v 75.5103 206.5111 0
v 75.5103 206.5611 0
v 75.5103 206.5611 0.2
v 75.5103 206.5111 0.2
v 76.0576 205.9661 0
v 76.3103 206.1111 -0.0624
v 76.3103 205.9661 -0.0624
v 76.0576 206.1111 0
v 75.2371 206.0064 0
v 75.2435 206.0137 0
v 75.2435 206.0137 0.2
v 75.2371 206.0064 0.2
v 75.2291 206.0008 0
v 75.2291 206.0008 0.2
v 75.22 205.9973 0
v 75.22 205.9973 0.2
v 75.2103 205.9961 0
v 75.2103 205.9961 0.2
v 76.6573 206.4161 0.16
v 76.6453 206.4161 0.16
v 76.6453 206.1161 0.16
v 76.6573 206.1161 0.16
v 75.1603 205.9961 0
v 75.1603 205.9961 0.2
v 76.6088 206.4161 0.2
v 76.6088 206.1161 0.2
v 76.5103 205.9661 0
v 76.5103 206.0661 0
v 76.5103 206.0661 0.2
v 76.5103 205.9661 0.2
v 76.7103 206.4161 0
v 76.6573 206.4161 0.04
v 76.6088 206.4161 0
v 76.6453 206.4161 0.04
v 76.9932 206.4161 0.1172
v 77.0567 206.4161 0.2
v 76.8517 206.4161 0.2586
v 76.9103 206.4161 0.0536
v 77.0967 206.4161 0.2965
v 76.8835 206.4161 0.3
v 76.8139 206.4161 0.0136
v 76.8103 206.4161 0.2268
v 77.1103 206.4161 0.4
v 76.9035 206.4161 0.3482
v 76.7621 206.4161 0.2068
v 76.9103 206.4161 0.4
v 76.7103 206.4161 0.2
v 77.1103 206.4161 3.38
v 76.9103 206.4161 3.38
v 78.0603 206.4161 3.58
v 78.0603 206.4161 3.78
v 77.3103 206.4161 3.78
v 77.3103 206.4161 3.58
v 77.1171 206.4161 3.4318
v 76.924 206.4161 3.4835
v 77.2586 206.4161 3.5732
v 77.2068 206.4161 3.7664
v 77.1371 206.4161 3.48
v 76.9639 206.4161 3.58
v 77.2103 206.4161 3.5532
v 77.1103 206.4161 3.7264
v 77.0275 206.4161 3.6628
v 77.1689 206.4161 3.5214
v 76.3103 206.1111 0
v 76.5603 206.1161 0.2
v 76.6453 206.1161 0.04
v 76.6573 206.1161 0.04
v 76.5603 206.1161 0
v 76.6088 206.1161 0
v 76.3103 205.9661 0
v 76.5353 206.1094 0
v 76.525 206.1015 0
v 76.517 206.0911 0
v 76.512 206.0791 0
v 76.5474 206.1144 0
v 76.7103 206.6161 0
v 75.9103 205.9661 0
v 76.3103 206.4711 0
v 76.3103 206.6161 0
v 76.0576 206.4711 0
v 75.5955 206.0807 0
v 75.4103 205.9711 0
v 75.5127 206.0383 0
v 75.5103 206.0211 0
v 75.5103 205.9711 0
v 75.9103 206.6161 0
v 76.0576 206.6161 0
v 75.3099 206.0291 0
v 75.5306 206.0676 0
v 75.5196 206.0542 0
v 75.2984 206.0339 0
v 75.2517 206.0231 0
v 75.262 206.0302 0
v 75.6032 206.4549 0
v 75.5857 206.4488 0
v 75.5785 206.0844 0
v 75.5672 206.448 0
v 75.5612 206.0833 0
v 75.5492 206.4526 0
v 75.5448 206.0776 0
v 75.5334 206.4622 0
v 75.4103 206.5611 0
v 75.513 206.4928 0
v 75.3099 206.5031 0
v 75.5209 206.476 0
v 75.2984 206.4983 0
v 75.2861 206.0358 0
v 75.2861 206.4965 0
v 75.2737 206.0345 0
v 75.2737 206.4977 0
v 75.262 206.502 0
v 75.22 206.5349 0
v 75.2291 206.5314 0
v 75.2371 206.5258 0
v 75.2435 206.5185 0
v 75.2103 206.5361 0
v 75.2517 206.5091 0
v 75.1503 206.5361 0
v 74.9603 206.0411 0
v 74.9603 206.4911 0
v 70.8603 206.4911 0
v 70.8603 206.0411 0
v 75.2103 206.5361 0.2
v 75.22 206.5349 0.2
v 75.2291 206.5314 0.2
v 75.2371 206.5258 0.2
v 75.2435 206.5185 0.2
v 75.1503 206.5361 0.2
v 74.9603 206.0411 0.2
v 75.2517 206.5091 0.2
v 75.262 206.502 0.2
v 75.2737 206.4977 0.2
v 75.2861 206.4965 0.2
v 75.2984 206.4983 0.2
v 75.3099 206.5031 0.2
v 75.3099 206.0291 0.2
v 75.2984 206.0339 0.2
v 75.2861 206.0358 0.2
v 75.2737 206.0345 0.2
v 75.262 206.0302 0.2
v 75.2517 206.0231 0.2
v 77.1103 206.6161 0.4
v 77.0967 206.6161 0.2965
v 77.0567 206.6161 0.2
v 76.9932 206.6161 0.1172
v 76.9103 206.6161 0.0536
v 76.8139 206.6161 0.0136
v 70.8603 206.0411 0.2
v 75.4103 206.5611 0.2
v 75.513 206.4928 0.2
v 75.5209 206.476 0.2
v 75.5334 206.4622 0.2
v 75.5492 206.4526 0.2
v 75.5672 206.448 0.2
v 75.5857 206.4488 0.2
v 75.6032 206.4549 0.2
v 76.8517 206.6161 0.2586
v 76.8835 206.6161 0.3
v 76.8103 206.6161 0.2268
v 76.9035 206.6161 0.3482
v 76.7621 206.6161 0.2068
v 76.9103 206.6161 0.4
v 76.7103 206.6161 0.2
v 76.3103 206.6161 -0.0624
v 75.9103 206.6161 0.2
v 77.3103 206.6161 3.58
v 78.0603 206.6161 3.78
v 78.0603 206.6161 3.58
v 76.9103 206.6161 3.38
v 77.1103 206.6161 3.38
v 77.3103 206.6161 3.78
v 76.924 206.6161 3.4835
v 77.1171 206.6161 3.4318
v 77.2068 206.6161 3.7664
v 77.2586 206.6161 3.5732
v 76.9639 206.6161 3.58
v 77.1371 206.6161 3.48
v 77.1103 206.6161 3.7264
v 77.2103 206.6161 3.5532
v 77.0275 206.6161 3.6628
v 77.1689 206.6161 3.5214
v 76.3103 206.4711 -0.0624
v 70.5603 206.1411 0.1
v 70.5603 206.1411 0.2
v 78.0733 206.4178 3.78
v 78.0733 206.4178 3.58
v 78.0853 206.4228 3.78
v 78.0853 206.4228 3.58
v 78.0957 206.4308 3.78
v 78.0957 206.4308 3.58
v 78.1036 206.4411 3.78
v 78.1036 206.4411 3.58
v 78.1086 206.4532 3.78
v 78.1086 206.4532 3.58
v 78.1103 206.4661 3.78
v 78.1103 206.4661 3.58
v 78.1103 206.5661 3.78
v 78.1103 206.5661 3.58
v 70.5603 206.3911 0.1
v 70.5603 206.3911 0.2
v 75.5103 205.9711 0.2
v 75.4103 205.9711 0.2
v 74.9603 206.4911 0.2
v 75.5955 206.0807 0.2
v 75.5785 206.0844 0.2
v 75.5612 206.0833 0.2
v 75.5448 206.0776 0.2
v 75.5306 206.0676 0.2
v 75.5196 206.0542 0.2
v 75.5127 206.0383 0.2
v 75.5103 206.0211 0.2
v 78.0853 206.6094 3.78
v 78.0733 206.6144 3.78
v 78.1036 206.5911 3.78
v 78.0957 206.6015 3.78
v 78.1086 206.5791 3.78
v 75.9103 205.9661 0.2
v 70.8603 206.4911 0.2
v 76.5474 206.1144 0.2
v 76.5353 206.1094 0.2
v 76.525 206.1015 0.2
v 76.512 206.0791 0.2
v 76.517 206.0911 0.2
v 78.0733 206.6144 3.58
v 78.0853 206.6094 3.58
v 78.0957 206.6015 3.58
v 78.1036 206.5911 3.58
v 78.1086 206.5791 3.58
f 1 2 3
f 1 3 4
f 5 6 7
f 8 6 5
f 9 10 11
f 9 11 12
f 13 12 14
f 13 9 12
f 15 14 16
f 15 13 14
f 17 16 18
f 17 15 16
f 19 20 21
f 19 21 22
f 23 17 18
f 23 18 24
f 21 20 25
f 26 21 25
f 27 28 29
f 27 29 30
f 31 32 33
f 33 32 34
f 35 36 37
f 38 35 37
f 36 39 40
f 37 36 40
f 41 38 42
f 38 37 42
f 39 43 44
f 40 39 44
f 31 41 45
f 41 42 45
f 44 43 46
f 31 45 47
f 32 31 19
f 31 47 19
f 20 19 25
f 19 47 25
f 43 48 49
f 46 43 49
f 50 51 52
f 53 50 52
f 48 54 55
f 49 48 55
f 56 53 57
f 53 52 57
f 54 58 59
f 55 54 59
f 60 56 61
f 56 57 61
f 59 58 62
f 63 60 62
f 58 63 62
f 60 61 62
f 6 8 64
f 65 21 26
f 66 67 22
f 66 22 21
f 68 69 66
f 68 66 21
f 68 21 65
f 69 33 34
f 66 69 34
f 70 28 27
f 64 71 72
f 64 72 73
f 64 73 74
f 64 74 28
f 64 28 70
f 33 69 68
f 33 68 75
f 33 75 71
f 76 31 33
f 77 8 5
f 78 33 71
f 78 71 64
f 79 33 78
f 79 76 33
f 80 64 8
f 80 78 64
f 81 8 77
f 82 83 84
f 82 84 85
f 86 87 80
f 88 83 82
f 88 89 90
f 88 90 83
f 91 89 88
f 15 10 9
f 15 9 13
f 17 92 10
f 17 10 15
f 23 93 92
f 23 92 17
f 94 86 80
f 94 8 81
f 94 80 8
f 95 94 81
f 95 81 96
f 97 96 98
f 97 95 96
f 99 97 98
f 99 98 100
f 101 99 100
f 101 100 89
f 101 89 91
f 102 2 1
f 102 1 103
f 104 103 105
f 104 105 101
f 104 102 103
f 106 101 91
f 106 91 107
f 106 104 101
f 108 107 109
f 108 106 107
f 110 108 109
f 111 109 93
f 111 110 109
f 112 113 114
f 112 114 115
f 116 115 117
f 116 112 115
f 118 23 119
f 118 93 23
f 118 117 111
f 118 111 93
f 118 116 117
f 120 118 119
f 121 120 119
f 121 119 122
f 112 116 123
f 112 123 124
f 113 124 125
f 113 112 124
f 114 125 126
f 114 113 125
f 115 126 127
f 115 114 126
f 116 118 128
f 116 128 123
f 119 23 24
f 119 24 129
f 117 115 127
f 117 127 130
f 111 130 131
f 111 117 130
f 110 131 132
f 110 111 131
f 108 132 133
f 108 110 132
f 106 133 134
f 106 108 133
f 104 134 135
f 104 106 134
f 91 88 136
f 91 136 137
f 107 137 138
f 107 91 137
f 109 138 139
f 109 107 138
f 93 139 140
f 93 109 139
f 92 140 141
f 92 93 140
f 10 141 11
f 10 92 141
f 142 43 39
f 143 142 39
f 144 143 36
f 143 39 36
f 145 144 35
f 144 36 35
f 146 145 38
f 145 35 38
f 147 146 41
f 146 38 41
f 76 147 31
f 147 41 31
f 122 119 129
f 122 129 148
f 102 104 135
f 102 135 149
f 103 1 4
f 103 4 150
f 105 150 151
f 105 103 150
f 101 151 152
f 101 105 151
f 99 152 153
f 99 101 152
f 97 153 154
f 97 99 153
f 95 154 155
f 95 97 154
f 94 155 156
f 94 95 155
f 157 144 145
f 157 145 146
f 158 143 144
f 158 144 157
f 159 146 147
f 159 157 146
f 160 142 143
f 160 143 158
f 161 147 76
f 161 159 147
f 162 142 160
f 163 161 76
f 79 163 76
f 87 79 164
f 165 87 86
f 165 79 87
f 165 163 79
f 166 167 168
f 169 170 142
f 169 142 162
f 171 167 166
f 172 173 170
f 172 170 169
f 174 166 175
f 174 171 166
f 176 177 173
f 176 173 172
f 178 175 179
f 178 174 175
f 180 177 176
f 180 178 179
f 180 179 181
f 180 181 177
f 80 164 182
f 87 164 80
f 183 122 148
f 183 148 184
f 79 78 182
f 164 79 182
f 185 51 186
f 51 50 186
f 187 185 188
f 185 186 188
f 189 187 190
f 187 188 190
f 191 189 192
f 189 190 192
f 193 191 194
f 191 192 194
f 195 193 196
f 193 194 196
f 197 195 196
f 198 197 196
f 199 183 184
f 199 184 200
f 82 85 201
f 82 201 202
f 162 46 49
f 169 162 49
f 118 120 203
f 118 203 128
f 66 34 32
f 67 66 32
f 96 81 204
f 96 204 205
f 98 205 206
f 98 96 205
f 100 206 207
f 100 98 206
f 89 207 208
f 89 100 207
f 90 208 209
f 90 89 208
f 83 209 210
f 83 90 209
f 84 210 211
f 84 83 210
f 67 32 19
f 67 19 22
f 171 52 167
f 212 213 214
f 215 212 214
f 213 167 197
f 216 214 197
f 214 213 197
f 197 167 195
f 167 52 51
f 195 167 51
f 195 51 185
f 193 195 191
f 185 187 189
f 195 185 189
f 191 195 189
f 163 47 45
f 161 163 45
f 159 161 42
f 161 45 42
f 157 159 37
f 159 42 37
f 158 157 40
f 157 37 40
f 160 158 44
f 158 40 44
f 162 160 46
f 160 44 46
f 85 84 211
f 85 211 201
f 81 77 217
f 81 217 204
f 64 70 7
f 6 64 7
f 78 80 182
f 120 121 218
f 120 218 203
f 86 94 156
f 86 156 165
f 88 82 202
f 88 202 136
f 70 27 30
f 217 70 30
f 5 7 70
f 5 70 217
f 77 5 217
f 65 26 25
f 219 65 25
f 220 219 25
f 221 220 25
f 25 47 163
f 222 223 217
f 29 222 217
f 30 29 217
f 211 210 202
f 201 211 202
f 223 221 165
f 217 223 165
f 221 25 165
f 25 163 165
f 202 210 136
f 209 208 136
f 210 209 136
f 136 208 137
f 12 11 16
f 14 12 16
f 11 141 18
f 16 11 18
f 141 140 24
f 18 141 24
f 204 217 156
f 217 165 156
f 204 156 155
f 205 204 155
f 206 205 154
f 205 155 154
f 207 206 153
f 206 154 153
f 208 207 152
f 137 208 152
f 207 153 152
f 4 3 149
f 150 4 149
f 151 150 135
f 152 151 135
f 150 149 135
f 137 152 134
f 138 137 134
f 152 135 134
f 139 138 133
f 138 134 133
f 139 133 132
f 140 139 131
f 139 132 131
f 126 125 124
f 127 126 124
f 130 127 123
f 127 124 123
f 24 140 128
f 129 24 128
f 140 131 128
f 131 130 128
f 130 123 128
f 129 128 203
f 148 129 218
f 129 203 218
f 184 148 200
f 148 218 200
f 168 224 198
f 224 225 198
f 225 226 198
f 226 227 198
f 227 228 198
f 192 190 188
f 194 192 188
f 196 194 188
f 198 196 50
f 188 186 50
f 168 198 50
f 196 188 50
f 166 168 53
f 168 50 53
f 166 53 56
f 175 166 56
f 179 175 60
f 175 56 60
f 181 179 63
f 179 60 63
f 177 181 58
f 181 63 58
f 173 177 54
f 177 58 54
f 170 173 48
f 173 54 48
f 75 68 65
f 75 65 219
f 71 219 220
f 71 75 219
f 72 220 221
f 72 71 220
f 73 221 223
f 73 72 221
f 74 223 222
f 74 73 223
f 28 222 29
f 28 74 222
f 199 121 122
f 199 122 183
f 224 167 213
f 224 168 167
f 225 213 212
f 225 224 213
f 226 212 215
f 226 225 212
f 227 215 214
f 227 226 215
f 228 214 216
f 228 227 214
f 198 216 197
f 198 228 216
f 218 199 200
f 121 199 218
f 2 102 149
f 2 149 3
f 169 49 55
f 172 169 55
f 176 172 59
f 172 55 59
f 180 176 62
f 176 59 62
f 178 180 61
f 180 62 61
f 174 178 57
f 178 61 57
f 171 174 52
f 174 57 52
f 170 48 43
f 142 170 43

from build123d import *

# Parameters (mm, degrees)
RESSALTO_EXTRUS_O1_DEPTH = 0.2
RESSALTO_EXTRUS_O2_DEPTH = 0.2
CORTE_EXTRUS_O1_DEPTH    = 1
FILETE1_R                = 0.05
RESSALTO_EXTRUS_O3_DEPTH = 0.145
PADR_O_LINEAR1_COUNT     = 2
PADR_O_LINEAR1_PITCH     = 0.505
CORTE_EXTRUS_O2_DEPTH    = 0.3


with BuildPart() as part:
    # Esboço1 → Ressalto-extrusão1 (new body)
    with BuildSketch(Plane.XY):
        with BuildLine():
            Line((76.710328142, 206.616112347), (76.710328142, 206.416112347))
            Line((76.710328142, 206.416112347), (76.657349848, 206.416112347))
            Line((76.657349848, 206.416112347), (76.657349848, 206.116112347))
            Line((76.657349848, 206.116112347), (76.645328142, 206.116112347))
            Line((76.645328142, 206.116112347), (76.610328142, 206.116112347))
            Line((76.610328142, 206.116112347), (76.560328142, 206.116112347))
            ThreePointArc((76.560328142, 206.116112347), (76.524972803, 206.101467686), (76.510328142, 206.066112347))
            Line((76.510328142, 206.066112347), (76.510328142, 205.966112347))
            Line((76.510328142, 205.966112347), (76.110328142, 205.966112347))
            Line((76.110328142, 205.966112347), (76.081970009, 205.966112347))
            Line((76.081970009, 205.966112347), (75.910328142, 205.966112347))
            Line((75.910328142, 205.966112347), (75.595453106, 206.080717488))
            ThreePointArc((75.595453106, 206.080717488), (75.537376388, 206.073071543), (75.510328142, 206.021112347))
            Line((75.510328142, 206.021112347), (75.510328142, 205.971112347))
            Line((75.510328142, 205.971112347), (75.410328142, 205.971112347))
            Line((75.410328142, 205.971112347), (75.309933917, 206.02907498))
            ThreePointArc((75.309933917, 206.02907498), (75.273690046, 206.034493063), (75.243486264, 206.013739619))
            ThreePointArc((75.243486264, 206.013739619), (75.229104336, 206.000793024), (75.210328142, 205.996112347))
            Line((75.210328142, 205.996112347), (75.160328142, 205.996112347))
            Line((75.160328142, 205.996112347), (74.960328142, 206.041112347))
            Line((74.960328142, 206.041112347), (70.860328142, 206.041112347))
            Line((70.860328142, 206.041112347), (70.560328142, 206.141112347))
            Line((70.560328142, 206.141112347), (70.560328142, 206.391112347))
            Line((70.560328142, 206.391112347), (70.860328142, 206.491112347))
            Line((70.860328142, 206.491112347), (74.960328142, 206.491112347))
            Line((74.960328142, 206.491112347), (75.150344741, 206.536112347))
            Line((75.150344741, 206.536112347), (75.210328142, 206.536112347))
            ThreePointArc((75.210328142, 206.536112347), (75.229104336, 206.53143167), (75.243486264, 206.518485075))
            ThreePointArc((75.243486264, 206.518485075), (75.273690046, 206.497731631), (75.309933917, 206.503149714))
            Line((75.309933917, 206.503149714), (75.410328142, 206.561112347))
            Line((75.410328142, 206.561112347), (75.510328142, 206.561112347))
            Line((75.510328142, 206.561112347), (75.510328142, 206.511112347))
            ThreePointArc((75.510328142, 206.511112347), (75.540942979, 206.456830135), (75.60323487, 206.454946752))
            Line((75.60323487, 206.454946752), (75.910328142, 206.616112347))
            Line((75.910328142, 206.616112347), (76.081970009, 206.616112347))
            Line((76.081970009, 206.616112347), (76.110328142, 206.616112347))
            Line((76.110328142, 206.616112347), (76.710328142, 206.616112347))
        make_face()
    extrude(amount=RESSALTO_EXTRUS_O1_DEPTH)

    # Esboço2 → Ressalto-extrusão2 (add)
    with BuildSketch(Plane.XZ.offset(-206.416112347)):
        with BuildLine():
            Line((76.710328142, 0), (76.710328142, 0.2))
            ThreePointArc((76.710328142, 0.2), (76.851749499, 0.258578644), (76.910328142, 0.4))
            Line((76.910328142, 0.4), (76.910328142, 3.38))
            ThreePointArc((76.910328142, 3.38), (77.02748543, 3.662842712), (77.310328142, 3.78))
            Line((77.310328142, 3.78), (78.110328142, 3.78))
            Line((78.110328142, 3.78), (78.110328142, 3.58))
            Line((78.110328142, 3.58), (77.310328142, 3.58))
            ThreePointArc((77.310328142, 3.58), (77.168906786, 3.521421356), (77.110328142, 3.38))
            Line((77.110328142, 3.38), (77.110328142, 0.4))
            ThreePointArc((77.110328142, 0.4), (76.993170855, 0.117157288), (76.710328142, 0))
        make_face()
    extrude(amount=-RESSALTO_EXTRUS_O2_DEPTH)

    # Esboço3 → Corte-extrusão1 (cut)
    with BuildSketch(Plane(origin=(0, 206.491112347, 0), x_dir=(1, 0, 0), z_dir=(0, 1, 0))):
        Polygon((70.860328142, 0), (70.560328142, -0.1), (70.475949981, -0.1), (70.475949981, 0.09851766), (70.860328142, 0.09851766), align=None)
    extrude(amount=-CORTE_EXTRUS_O1_DEPTH, mode=Mode.SUBTRACT)

    # Filete1
    filete1_edges = [part.edges().sort_by_distance(p)[0] for p in [
        (78.110328142, 206.616112347, 3.68),
        (78.110328142, 206.416112347, 3.68),
    ]]
    fillet(filete1_edges, radius=FILETE1_R)

    # Esboço4 → Ressalto-extrusão3 (add)
    with BuildSketch(Plane(origin=(0, 206.616112347, 0), x_dir=(1, 0, 0), z_dir=(0, 1, 0))):
        Polygon((76.057628142, 0), (76.310328142, 0), (76.310328142, 0.0624), align=None)
    ressalto_extrus_o3 = extrude(amount=-RESSALTO_EXTRUS_O3_DEPTH)

    # Padrão linear1: Ressalto-extrusão3 ×2
    with Locations(*[(0, -i * PADR_O_LINEAR1_PITCH, 0) for i in range(1, PADR_O_LINEAR1_COUNT)]):
        add(ressalto_extrus_o3)

    # Esboço5 → Corte-extrusão2 (cut)
    with BuildSketch(Plane.XZ.offset(-206.116112347)):
        Polygon((76.657349848, 0.16), (76.645349848, 0.16), (76.608838995, 0.2), (76.608838995, 0.232444762), (76.679680574, 0.232444762), (76.679680574, 0.16), align=None)
        Polygon((76.608838995, 0), (76.645349848, 0.04), (76.679680574, 0.04), (76.679680574, -0.014078239), (76.608838995, -0.014078239), align=None)
    extrude(amount=-CORTE_EXTRUS_O2_DEPTH, mode=Mode.SUBTRACT)


solid = part.part
